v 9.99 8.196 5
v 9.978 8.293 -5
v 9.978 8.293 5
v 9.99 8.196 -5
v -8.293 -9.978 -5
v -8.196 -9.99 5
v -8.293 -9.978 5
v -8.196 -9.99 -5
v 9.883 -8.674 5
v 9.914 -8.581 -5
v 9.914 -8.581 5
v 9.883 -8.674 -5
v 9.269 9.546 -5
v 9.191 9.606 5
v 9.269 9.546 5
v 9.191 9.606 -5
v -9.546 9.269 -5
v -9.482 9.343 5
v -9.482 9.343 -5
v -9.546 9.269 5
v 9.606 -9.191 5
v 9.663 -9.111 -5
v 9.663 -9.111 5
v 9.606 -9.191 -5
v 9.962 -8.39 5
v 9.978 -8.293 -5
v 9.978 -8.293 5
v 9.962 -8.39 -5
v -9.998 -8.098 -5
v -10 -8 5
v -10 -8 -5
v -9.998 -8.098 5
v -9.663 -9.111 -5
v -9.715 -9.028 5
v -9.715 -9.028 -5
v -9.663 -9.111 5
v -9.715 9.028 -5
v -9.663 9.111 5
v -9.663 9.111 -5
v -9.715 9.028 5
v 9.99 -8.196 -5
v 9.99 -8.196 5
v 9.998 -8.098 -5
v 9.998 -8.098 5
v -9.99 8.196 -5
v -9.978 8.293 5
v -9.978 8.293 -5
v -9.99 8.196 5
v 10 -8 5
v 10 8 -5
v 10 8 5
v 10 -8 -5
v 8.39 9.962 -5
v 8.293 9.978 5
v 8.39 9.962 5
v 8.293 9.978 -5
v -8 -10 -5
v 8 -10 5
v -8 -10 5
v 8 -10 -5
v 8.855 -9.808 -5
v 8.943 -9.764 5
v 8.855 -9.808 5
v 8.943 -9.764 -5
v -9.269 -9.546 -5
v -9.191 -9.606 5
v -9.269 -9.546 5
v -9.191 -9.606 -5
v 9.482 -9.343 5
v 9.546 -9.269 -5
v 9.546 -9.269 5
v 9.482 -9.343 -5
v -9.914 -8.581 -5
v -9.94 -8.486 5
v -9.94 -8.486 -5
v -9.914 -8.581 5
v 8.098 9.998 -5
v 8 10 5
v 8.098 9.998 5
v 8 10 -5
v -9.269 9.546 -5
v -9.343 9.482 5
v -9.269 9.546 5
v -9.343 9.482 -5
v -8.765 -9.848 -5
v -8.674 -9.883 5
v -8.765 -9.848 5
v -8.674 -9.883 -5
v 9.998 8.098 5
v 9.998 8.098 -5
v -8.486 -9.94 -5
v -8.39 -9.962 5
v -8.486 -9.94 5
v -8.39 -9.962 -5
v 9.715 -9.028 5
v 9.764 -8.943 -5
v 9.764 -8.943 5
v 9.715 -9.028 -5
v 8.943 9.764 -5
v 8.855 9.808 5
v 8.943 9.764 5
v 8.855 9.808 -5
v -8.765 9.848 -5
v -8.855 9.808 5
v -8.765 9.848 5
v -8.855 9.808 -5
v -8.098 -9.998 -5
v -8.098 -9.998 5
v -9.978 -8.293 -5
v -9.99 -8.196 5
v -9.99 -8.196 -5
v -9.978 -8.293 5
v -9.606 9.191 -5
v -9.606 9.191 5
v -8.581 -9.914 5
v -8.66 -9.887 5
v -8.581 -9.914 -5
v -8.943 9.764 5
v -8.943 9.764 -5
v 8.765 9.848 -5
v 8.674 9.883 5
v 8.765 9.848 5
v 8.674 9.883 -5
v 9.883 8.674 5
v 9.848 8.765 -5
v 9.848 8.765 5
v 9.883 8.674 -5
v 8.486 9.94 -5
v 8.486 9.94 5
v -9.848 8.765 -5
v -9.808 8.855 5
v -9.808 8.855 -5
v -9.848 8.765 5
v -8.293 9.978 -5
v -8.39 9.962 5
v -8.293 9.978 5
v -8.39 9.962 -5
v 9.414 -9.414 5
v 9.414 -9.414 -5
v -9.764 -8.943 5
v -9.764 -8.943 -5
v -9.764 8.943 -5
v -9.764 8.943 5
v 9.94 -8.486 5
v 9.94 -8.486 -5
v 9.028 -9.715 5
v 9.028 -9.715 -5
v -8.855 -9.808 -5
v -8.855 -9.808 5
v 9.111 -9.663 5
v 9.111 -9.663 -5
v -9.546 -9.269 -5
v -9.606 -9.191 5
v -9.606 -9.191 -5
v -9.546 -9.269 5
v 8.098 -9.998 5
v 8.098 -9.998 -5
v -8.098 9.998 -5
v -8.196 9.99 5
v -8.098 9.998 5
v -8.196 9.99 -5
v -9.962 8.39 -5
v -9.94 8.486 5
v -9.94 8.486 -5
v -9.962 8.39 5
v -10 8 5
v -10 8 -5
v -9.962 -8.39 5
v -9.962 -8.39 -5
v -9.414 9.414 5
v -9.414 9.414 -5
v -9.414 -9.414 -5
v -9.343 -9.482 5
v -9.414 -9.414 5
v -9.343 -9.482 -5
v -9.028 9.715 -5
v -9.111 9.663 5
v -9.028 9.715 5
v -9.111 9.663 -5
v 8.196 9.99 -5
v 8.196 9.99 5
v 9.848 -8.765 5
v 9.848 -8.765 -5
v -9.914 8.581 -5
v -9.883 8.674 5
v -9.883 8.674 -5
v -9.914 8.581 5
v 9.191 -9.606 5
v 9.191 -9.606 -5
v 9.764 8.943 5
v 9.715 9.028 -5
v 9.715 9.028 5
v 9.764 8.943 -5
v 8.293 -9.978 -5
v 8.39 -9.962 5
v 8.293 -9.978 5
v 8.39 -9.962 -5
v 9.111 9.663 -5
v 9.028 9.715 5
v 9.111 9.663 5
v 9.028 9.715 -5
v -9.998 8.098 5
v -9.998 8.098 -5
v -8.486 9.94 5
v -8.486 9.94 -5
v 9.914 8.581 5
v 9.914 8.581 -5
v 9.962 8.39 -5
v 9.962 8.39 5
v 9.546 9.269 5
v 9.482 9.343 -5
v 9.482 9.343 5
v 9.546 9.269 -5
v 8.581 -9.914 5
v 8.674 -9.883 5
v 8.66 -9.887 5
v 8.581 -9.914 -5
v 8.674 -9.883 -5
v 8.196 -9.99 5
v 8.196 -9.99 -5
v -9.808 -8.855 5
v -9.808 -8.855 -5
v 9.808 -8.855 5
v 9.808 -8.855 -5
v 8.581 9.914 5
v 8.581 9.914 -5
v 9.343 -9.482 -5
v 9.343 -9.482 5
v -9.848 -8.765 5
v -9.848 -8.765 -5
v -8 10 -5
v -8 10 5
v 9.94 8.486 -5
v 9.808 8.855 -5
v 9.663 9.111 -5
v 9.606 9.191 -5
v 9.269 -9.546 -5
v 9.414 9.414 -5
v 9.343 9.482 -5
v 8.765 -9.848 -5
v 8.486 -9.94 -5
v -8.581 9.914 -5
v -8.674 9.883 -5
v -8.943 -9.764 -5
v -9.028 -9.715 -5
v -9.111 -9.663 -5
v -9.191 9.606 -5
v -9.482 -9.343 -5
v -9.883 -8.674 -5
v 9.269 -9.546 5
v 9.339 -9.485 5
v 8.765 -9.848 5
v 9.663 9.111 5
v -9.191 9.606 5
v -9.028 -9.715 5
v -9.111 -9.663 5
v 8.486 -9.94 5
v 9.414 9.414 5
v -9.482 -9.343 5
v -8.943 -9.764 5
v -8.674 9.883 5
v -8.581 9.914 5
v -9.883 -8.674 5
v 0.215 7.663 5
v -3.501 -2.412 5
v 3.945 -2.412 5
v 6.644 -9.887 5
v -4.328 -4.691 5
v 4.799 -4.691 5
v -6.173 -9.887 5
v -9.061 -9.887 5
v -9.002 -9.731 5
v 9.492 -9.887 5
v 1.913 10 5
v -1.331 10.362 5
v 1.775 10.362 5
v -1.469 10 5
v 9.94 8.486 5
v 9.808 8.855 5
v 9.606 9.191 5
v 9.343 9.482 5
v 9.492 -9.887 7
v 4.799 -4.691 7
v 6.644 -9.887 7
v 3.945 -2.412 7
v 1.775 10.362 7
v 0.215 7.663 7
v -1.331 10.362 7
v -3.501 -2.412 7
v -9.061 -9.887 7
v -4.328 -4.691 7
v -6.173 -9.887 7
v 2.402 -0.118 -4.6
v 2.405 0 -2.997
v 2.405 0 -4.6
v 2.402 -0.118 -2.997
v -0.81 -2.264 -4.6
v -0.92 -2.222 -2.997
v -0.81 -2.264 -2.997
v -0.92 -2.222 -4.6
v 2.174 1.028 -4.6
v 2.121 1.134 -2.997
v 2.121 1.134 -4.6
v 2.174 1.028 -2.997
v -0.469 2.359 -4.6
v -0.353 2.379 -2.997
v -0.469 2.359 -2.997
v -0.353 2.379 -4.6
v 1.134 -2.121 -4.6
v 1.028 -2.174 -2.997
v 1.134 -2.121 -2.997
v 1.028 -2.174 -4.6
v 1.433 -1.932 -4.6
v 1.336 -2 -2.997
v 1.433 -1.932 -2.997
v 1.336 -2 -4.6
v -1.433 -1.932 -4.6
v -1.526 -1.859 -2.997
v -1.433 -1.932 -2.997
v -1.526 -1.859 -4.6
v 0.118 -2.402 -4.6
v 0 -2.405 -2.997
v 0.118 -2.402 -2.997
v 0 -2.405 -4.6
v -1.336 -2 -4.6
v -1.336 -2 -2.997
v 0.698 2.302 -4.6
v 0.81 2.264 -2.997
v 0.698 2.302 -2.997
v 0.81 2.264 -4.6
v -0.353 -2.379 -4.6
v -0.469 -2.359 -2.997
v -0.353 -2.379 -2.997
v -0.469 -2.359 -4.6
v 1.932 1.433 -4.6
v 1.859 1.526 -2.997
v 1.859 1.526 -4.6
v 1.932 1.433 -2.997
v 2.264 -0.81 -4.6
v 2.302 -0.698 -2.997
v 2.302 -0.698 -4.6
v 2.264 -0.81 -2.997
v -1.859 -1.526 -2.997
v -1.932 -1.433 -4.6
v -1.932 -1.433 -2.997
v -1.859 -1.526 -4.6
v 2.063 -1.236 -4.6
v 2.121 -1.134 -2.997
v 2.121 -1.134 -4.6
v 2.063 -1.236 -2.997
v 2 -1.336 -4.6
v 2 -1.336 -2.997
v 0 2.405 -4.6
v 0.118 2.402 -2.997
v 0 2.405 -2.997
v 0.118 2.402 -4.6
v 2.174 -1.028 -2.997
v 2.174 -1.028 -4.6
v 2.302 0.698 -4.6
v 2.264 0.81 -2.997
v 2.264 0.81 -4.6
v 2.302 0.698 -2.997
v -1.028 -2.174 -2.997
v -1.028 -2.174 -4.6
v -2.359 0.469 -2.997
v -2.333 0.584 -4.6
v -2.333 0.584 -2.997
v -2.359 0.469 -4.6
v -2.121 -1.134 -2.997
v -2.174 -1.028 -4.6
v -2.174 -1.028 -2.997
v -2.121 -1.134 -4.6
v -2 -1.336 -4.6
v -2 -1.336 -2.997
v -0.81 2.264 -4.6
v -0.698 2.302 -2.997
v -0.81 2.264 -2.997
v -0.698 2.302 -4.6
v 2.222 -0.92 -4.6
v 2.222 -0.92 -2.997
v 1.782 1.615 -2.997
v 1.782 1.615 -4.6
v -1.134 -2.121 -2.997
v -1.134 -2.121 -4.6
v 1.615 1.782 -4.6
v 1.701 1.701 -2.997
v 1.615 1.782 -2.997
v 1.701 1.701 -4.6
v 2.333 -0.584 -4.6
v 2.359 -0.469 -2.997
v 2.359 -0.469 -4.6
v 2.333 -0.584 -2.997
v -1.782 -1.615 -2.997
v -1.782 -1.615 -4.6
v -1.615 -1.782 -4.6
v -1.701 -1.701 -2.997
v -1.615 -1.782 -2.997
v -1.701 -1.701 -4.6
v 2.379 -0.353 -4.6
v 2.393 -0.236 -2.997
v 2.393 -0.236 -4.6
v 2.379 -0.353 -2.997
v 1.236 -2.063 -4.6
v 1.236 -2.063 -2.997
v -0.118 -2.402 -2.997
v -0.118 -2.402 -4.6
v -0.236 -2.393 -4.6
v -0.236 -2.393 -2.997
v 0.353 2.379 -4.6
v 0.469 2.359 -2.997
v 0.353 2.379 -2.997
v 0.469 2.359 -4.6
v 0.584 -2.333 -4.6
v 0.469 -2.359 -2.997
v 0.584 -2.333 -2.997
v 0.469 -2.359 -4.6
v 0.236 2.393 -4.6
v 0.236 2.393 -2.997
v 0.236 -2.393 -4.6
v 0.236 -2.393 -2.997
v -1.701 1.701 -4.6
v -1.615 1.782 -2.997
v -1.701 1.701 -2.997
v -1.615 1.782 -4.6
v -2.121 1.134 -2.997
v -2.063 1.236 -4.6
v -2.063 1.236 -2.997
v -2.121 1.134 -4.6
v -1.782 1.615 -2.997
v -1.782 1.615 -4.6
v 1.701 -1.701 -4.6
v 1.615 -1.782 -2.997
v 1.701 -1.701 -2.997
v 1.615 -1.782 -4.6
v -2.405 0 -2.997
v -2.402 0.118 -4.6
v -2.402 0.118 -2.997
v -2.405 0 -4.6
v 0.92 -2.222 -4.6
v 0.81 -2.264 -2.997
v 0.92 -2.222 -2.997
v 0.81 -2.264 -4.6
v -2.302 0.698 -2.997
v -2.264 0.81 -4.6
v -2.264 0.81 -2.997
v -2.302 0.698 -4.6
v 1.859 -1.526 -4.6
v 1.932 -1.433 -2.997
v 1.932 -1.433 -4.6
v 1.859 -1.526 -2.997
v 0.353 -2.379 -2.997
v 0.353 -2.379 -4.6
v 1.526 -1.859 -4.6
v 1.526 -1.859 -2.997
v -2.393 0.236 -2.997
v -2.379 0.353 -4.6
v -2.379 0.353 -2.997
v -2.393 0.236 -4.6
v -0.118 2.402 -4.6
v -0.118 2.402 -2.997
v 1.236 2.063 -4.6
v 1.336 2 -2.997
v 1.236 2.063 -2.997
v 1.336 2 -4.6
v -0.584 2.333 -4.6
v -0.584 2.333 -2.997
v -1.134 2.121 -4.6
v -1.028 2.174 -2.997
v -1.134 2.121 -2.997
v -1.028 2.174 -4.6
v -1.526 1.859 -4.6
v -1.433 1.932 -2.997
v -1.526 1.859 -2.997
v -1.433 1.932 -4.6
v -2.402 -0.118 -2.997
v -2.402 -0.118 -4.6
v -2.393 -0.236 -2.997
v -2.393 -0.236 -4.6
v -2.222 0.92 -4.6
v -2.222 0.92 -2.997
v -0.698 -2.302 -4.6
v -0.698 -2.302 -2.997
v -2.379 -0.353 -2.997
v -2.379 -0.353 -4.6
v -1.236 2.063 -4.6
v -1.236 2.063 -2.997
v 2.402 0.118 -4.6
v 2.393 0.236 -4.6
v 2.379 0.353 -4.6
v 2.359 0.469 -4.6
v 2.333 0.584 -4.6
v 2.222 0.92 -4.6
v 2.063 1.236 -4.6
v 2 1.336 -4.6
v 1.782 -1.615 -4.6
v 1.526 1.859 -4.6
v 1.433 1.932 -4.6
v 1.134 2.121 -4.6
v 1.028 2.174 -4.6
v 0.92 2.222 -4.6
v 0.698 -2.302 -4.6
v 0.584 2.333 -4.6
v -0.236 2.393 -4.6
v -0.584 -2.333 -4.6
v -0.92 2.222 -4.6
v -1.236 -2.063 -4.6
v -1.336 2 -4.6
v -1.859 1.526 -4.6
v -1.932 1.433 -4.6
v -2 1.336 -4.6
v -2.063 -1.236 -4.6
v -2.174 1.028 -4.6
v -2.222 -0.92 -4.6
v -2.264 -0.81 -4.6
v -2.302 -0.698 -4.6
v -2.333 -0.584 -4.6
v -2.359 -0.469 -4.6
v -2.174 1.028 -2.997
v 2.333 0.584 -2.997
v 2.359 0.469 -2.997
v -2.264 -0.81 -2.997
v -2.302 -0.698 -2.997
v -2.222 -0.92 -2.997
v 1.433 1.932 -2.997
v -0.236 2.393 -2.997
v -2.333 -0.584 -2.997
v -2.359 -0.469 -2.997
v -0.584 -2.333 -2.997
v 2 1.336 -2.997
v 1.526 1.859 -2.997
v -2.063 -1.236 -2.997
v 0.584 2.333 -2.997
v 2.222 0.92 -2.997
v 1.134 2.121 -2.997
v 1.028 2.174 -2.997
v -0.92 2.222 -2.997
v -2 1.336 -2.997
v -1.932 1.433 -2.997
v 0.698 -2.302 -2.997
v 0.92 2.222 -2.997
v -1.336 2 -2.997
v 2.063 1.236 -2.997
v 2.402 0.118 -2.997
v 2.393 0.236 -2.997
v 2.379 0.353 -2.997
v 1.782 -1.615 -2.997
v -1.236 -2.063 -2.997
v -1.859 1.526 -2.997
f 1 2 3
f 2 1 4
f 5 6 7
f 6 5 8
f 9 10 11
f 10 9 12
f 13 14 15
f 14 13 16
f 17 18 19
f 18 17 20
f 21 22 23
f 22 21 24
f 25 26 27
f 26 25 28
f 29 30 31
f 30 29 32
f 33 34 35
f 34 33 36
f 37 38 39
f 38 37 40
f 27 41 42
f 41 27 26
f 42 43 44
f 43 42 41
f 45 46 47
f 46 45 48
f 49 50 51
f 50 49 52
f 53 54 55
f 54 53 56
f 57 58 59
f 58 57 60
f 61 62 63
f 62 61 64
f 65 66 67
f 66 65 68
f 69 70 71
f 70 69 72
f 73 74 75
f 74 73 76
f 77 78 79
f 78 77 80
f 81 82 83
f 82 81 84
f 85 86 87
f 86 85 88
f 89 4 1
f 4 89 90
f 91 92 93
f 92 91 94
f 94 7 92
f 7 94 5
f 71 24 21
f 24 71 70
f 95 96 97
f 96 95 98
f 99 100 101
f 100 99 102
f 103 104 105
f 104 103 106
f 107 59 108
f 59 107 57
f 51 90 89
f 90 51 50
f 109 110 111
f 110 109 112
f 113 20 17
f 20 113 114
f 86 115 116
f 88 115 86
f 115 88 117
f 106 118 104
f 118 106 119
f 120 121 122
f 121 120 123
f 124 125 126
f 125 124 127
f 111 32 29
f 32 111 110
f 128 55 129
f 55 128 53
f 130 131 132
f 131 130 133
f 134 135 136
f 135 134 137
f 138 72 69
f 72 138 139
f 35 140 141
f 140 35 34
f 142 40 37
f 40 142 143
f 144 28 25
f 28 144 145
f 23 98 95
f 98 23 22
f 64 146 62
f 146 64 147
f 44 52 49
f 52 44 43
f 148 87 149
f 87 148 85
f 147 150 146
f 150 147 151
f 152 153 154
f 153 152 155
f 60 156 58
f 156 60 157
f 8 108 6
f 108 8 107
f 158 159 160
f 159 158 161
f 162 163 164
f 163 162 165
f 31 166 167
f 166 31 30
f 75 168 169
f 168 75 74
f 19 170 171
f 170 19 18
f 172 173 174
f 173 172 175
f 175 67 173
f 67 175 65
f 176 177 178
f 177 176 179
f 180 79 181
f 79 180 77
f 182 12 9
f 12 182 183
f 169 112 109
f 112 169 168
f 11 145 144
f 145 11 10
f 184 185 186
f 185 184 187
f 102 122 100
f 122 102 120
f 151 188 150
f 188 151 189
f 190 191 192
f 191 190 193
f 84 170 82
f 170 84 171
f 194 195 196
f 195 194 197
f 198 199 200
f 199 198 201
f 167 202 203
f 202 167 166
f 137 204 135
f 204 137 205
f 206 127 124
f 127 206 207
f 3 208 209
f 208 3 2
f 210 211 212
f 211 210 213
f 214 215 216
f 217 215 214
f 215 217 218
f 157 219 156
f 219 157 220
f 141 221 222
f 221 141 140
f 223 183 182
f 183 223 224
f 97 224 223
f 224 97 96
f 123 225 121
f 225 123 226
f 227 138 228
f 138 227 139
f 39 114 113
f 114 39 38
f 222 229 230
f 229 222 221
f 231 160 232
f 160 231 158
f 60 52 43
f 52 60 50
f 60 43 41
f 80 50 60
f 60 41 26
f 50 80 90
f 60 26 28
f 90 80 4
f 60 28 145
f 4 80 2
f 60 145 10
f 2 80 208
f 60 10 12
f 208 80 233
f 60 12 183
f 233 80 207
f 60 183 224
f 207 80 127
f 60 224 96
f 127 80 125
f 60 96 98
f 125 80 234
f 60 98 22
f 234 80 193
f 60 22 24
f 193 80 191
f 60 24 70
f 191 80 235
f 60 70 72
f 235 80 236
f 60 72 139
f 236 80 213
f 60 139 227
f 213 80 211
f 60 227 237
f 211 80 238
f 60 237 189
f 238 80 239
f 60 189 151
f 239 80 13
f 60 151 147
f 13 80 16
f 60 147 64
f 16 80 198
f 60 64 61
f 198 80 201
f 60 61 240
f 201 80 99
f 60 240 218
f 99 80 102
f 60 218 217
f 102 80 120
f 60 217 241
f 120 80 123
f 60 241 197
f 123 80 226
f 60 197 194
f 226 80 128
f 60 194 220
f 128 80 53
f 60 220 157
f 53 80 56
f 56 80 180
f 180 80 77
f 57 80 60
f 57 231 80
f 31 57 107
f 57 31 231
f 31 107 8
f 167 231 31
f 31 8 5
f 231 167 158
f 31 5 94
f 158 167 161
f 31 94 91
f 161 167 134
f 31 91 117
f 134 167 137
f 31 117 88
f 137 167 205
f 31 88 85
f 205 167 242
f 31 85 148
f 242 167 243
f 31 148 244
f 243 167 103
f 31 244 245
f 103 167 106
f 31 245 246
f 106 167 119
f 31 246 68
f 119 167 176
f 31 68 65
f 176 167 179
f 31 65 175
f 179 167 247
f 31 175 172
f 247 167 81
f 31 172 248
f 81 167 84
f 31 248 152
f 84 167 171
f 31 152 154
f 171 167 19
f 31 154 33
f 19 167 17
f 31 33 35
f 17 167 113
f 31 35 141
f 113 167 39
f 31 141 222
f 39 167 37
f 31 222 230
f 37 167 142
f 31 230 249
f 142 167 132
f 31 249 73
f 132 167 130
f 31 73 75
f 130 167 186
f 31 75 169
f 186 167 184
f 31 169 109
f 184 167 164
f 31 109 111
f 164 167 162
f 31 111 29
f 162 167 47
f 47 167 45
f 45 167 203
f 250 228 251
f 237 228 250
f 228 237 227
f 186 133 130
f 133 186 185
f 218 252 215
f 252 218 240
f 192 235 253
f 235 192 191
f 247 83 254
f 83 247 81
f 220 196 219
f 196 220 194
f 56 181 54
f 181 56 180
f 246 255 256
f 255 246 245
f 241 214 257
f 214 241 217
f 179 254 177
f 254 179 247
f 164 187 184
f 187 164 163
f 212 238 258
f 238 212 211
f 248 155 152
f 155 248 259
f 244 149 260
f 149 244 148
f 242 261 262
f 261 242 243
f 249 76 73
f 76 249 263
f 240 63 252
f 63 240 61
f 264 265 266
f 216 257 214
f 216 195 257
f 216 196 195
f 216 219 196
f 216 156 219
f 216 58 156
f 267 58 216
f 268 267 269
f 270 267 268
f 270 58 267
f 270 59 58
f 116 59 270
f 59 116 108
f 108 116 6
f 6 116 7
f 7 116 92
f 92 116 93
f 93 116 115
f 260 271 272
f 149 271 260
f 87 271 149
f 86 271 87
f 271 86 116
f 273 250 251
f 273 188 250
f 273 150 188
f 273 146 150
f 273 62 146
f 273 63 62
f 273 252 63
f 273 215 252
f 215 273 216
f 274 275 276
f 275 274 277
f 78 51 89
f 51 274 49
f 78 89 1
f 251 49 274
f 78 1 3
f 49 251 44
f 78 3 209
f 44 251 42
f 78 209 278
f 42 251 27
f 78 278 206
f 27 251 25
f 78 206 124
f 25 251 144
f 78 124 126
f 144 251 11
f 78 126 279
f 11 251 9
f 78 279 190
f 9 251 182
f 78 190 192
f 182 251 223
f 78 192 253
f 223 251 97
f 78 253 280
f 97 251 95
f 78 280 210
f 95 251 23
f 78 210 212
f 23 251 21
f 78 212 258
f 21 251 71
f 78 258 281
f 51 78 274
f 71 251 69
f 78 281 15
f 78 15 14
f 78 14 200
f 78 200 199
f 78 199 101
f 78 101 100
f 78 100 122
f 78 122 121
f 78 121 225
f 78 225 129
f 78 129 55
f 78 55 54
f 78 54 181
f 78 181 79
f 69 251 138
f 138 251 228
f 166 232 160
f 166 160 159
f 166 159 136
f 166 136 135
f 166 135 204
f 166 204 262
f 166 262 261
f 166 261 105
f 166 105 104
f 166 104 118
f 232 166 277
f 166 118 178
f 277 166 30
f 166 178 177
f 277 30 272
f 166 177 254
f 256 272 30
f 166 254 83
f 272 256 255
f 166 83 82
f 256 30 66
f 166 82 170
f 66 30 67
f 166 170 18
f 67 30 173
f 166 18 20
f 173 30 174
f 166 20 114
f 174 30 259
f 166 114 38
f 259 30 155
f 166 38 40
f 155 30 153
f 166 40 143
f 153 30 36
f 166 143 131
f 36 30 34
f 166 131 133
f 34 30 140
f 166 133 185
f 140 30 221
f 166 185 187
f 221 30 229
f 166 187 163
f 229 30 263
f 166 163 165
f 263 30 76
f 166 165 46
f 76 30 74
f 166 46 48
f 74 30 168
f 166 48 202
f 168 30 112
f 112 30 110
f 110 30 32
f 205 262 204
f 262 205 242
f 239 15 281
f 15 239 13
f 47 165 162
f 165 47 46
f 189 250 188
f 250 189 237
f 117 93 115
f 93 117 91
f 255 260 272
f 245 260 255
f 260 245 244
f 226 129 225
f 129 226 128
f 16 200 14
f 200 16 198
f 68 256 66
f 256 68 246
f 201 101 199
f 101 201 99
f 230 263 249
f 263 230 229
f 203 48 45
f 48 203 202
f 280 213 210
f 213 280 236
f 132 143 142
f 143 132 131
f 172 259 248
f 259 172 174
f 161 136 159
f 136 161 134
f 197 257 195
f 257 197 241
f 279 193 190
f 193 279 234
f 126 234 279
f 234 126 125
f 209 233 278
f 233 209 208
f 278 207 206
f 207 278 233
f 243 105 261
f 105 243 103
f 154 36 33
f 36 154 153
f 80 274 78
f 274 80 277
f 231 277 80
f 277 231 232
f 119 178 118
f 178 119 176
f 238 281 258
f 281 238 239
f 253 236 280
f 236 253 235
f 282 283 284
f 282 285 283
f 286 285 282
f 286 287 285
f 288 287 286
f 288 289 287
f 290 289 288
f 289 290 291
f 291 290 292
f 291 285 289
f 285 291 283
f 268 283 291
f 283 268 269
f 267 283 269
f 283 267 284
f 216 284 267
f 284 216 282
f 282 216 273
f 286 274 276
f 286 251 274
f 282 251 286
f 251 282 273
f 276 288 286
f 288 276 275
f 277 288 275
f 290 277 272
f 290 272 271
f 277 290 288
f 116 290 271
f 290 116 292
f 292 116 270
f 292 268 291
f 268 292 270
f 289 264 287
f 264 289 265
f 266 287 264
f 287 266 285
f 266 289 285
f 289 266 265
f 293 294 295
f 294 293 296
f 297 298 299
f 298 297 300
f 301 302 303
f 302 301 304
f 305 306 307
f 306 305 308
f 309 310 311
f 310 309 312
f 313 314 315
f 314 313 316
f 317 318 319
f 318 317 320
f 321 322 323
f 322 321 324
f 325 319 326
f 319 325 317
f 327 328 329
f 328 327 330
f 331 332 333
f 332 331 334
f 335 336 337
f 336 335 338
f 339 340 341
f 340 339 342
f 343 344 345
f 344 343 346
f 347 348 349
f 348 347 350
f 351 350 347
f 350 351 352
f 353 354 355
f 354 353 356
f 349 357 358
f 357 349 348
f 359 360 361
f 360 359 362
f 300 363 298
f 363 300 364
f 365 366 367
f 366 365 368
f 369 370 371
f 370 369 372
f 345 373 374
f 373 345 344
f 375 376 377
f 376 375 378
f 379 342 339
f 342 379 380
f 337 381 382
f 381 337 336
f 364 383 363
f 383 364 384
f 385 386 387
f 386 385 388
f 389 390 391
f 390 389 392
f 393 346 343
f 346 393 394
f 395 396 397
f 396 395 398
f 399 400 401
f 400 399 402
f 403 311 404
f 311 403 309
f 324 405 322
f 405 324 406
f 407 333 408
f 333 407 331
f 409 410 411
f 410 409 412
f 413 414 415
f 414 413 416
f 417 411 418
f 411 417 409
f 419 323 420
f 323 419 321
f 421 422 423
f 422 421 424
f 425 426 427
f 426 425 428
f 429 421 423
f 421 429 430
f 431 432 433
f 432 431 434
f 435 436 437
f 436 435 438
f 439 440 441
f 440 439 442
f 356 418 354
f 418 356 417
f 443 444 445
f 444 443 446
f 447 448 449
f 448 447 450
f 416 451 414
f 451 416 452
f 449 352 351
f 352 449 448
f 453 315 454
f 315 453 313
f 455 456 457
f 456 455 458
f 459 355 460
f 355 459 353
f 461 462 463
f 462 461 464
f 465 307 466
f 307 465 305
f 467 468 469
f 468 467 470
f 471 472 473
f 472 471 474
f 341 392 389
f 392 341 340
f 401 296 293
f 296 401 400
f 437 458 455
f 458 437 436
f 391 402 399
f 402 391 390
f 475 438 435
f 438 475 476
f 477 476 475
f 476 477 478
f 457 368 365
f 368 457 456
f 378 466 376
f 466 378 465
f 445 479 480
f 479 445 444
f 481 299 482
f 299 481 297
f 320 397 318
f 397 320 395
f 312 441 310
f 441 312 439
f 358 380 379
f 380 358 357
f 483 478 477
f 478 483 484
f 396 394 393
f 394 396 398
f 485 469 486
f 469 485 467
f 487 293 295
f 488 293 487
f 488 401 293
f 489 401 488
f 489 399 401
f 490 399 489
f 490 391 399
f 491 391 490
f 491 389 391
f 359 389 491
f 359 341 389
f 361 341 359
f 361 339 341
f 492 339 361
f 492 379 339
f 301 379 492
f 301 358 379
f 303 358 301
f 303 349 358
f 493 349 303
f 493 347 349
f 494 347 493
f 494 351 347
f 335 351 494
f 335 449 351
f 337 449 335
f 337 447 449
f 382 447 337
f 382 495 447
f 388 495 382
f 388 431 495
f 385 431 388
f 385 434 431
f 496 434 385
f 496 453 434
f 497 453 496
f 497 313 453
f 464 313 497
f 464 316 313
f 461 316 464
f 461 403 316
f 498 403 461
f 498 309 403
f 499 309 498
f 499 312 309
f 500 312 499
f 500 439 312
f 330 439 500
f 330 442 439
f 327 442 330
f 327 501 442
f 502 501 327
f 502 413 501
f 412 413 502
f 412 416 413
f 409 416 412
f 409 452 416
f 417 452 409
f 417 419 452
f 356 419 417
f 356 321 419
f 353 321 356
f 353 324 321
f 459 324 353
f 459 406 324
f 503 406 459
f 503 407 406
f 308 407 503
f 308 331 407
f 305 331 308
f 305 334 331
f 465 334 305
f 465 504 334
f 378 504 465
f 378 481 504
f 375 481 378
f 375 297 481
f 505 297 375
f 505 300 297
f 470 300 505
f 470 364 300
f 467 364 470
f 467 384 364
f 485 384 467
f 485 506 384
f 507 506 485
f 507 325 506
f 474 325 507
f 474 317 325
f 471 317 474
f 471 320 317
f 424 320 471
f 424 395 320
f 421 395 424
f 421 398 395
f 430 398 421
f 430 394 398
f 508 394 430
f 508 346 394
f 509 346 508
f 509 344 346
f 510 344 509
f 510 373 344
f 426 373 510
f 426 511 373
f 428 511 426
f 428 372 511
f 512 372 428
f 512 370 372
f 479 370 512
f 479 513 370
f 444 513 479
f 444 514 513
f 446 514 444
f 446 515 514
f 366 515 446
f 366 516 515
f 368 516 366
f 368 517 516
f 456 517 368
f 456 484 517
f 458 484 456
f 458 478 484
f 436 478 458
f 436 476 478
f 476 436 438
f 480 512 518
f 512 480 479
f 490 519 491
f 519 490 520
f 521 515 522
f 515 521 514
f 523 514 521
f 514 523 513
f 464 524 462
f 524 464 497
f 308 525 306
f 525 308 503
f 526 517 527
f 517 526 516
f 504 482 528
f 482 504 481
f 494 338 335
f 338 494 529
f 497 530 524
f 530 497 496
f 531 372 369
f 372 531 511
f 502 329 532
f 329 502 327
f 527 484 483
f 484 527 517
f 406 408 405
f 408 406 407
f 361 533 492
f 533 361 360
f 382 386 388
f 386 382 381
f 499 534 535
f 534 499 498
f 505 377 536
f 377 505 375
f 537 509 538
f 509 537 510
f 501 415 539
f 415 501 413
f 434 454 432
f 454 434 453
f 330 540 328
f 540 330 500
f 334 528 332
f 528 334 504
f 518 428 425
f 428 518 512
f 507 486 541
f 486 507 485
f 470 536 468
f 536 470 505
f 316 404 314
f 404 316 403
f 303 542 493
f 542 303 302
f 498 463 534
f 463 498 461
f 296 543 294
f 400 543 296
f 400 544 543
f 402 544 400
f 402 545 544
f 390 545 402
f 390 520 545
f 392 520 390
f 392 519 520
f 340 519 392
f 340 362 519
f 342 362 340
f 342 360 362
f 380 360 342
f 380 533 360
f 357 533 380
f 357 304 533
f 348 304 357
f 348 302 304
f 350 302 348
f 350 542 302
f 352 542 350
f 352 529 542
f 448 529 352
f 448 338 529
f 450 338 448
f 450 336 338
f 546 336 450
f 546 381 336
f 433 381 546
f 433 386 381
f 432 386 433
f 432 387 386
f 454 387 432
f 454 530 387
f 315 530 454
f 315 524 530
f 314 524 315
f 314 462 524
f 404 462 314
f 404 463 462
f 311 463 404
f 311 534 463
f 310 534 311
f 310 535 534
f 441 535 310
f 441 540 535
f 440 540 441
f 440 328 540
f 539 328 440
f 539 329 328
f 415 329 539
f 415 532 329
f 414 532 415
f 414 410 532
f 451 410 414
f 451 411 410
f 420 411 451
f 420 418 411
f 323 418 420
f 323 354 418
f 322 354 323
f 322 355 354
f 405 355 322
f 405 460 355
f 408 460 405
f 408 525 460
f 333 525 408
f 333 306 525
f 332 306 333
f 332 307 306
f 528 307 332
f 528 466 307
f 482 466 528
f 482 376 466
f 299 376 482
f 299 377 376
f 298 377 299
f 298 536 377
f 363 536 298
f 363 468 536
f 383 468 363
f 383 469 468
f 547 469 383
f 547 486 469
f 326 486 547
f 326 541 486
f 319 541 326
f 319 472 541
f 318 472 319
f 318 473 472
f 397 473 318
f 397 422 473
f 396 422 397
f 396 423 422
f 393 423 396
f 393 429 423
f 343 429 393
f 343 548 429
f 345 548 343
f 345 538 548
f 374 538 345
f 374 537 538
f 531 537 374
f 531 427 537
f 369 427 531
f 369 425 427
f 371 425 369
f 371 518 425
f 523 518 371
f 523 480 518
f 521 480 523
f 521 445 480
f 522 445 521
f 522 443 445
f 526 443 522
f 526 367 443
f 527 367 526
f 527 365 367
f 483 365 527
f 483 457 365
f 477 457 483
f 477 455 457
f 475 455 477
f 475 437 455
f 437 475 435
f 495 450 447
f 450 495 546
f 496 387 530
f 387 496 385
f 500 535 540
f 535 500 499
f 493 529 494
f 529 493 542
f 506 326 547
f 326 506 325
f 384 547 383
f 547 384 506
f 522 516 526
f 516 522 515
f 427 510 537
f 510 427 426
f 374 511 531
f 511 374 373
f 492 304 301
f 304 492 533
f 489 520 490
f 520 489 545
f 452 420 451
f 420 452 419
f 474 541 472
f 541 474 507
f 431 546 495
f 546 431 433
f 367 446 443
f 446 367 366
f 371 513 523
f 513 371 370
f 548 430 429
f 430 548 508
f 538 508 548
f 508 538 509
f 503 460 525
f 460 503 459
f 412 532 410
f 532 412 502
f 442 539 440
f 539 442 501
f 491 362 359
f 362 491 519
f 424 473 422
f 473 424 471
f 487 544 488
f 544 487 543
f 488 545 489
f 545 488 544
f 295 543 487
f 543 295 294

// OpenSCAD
$fn = 128;
// Define parameters
square_size = [20, 20];
square_height = 10;
text_size = 20; // Font size for the character 'A'
text_height = 2;
fillet_radius = 2; // Fillet radius for side edges

magnet_offset = 0.4;
magnet_radius = 3/16 * (25.4) * 1.01 / 2;
magnet_height = (1/16) * (25.4) * 1.01;

// Parameter to pass the character
char_to_cutout = "A"; // Default character

module rounded_square_2d(size, radius) {
    // Create a 2D square with rounded corners (only the 4 sides will be affected)
    minkowski() {
        square([size[0] - radius * 2, size[1] - radius * 2], center = true); // Shrink the square
        circle(r=radius); // Add 2mm fillet to the corners
    }
}

difference() {
    union() {
        // Create the main rounded square, but only round the side edges
        color("purple")
        linear_extrude(height = square_height, center=true)
            rounded_square_2d(square_size, fillet_radius);

        // Subtract the character in the center
        color("red")
        translate([0, 0, square_height/2])
            linear_extrude(height = text_height) // Extrude slightly to ensure complete cutout
            text(char_to_cutout, size = text_size, valign = "center", halign = "center", font = "ComicShannsMono Nerd Font:style=Regular");
    }
    translate([0,0,-square_height/2 + magnet_offset])
        linear_extrude(magnet_height)
        circle(magnet_radius);
}
